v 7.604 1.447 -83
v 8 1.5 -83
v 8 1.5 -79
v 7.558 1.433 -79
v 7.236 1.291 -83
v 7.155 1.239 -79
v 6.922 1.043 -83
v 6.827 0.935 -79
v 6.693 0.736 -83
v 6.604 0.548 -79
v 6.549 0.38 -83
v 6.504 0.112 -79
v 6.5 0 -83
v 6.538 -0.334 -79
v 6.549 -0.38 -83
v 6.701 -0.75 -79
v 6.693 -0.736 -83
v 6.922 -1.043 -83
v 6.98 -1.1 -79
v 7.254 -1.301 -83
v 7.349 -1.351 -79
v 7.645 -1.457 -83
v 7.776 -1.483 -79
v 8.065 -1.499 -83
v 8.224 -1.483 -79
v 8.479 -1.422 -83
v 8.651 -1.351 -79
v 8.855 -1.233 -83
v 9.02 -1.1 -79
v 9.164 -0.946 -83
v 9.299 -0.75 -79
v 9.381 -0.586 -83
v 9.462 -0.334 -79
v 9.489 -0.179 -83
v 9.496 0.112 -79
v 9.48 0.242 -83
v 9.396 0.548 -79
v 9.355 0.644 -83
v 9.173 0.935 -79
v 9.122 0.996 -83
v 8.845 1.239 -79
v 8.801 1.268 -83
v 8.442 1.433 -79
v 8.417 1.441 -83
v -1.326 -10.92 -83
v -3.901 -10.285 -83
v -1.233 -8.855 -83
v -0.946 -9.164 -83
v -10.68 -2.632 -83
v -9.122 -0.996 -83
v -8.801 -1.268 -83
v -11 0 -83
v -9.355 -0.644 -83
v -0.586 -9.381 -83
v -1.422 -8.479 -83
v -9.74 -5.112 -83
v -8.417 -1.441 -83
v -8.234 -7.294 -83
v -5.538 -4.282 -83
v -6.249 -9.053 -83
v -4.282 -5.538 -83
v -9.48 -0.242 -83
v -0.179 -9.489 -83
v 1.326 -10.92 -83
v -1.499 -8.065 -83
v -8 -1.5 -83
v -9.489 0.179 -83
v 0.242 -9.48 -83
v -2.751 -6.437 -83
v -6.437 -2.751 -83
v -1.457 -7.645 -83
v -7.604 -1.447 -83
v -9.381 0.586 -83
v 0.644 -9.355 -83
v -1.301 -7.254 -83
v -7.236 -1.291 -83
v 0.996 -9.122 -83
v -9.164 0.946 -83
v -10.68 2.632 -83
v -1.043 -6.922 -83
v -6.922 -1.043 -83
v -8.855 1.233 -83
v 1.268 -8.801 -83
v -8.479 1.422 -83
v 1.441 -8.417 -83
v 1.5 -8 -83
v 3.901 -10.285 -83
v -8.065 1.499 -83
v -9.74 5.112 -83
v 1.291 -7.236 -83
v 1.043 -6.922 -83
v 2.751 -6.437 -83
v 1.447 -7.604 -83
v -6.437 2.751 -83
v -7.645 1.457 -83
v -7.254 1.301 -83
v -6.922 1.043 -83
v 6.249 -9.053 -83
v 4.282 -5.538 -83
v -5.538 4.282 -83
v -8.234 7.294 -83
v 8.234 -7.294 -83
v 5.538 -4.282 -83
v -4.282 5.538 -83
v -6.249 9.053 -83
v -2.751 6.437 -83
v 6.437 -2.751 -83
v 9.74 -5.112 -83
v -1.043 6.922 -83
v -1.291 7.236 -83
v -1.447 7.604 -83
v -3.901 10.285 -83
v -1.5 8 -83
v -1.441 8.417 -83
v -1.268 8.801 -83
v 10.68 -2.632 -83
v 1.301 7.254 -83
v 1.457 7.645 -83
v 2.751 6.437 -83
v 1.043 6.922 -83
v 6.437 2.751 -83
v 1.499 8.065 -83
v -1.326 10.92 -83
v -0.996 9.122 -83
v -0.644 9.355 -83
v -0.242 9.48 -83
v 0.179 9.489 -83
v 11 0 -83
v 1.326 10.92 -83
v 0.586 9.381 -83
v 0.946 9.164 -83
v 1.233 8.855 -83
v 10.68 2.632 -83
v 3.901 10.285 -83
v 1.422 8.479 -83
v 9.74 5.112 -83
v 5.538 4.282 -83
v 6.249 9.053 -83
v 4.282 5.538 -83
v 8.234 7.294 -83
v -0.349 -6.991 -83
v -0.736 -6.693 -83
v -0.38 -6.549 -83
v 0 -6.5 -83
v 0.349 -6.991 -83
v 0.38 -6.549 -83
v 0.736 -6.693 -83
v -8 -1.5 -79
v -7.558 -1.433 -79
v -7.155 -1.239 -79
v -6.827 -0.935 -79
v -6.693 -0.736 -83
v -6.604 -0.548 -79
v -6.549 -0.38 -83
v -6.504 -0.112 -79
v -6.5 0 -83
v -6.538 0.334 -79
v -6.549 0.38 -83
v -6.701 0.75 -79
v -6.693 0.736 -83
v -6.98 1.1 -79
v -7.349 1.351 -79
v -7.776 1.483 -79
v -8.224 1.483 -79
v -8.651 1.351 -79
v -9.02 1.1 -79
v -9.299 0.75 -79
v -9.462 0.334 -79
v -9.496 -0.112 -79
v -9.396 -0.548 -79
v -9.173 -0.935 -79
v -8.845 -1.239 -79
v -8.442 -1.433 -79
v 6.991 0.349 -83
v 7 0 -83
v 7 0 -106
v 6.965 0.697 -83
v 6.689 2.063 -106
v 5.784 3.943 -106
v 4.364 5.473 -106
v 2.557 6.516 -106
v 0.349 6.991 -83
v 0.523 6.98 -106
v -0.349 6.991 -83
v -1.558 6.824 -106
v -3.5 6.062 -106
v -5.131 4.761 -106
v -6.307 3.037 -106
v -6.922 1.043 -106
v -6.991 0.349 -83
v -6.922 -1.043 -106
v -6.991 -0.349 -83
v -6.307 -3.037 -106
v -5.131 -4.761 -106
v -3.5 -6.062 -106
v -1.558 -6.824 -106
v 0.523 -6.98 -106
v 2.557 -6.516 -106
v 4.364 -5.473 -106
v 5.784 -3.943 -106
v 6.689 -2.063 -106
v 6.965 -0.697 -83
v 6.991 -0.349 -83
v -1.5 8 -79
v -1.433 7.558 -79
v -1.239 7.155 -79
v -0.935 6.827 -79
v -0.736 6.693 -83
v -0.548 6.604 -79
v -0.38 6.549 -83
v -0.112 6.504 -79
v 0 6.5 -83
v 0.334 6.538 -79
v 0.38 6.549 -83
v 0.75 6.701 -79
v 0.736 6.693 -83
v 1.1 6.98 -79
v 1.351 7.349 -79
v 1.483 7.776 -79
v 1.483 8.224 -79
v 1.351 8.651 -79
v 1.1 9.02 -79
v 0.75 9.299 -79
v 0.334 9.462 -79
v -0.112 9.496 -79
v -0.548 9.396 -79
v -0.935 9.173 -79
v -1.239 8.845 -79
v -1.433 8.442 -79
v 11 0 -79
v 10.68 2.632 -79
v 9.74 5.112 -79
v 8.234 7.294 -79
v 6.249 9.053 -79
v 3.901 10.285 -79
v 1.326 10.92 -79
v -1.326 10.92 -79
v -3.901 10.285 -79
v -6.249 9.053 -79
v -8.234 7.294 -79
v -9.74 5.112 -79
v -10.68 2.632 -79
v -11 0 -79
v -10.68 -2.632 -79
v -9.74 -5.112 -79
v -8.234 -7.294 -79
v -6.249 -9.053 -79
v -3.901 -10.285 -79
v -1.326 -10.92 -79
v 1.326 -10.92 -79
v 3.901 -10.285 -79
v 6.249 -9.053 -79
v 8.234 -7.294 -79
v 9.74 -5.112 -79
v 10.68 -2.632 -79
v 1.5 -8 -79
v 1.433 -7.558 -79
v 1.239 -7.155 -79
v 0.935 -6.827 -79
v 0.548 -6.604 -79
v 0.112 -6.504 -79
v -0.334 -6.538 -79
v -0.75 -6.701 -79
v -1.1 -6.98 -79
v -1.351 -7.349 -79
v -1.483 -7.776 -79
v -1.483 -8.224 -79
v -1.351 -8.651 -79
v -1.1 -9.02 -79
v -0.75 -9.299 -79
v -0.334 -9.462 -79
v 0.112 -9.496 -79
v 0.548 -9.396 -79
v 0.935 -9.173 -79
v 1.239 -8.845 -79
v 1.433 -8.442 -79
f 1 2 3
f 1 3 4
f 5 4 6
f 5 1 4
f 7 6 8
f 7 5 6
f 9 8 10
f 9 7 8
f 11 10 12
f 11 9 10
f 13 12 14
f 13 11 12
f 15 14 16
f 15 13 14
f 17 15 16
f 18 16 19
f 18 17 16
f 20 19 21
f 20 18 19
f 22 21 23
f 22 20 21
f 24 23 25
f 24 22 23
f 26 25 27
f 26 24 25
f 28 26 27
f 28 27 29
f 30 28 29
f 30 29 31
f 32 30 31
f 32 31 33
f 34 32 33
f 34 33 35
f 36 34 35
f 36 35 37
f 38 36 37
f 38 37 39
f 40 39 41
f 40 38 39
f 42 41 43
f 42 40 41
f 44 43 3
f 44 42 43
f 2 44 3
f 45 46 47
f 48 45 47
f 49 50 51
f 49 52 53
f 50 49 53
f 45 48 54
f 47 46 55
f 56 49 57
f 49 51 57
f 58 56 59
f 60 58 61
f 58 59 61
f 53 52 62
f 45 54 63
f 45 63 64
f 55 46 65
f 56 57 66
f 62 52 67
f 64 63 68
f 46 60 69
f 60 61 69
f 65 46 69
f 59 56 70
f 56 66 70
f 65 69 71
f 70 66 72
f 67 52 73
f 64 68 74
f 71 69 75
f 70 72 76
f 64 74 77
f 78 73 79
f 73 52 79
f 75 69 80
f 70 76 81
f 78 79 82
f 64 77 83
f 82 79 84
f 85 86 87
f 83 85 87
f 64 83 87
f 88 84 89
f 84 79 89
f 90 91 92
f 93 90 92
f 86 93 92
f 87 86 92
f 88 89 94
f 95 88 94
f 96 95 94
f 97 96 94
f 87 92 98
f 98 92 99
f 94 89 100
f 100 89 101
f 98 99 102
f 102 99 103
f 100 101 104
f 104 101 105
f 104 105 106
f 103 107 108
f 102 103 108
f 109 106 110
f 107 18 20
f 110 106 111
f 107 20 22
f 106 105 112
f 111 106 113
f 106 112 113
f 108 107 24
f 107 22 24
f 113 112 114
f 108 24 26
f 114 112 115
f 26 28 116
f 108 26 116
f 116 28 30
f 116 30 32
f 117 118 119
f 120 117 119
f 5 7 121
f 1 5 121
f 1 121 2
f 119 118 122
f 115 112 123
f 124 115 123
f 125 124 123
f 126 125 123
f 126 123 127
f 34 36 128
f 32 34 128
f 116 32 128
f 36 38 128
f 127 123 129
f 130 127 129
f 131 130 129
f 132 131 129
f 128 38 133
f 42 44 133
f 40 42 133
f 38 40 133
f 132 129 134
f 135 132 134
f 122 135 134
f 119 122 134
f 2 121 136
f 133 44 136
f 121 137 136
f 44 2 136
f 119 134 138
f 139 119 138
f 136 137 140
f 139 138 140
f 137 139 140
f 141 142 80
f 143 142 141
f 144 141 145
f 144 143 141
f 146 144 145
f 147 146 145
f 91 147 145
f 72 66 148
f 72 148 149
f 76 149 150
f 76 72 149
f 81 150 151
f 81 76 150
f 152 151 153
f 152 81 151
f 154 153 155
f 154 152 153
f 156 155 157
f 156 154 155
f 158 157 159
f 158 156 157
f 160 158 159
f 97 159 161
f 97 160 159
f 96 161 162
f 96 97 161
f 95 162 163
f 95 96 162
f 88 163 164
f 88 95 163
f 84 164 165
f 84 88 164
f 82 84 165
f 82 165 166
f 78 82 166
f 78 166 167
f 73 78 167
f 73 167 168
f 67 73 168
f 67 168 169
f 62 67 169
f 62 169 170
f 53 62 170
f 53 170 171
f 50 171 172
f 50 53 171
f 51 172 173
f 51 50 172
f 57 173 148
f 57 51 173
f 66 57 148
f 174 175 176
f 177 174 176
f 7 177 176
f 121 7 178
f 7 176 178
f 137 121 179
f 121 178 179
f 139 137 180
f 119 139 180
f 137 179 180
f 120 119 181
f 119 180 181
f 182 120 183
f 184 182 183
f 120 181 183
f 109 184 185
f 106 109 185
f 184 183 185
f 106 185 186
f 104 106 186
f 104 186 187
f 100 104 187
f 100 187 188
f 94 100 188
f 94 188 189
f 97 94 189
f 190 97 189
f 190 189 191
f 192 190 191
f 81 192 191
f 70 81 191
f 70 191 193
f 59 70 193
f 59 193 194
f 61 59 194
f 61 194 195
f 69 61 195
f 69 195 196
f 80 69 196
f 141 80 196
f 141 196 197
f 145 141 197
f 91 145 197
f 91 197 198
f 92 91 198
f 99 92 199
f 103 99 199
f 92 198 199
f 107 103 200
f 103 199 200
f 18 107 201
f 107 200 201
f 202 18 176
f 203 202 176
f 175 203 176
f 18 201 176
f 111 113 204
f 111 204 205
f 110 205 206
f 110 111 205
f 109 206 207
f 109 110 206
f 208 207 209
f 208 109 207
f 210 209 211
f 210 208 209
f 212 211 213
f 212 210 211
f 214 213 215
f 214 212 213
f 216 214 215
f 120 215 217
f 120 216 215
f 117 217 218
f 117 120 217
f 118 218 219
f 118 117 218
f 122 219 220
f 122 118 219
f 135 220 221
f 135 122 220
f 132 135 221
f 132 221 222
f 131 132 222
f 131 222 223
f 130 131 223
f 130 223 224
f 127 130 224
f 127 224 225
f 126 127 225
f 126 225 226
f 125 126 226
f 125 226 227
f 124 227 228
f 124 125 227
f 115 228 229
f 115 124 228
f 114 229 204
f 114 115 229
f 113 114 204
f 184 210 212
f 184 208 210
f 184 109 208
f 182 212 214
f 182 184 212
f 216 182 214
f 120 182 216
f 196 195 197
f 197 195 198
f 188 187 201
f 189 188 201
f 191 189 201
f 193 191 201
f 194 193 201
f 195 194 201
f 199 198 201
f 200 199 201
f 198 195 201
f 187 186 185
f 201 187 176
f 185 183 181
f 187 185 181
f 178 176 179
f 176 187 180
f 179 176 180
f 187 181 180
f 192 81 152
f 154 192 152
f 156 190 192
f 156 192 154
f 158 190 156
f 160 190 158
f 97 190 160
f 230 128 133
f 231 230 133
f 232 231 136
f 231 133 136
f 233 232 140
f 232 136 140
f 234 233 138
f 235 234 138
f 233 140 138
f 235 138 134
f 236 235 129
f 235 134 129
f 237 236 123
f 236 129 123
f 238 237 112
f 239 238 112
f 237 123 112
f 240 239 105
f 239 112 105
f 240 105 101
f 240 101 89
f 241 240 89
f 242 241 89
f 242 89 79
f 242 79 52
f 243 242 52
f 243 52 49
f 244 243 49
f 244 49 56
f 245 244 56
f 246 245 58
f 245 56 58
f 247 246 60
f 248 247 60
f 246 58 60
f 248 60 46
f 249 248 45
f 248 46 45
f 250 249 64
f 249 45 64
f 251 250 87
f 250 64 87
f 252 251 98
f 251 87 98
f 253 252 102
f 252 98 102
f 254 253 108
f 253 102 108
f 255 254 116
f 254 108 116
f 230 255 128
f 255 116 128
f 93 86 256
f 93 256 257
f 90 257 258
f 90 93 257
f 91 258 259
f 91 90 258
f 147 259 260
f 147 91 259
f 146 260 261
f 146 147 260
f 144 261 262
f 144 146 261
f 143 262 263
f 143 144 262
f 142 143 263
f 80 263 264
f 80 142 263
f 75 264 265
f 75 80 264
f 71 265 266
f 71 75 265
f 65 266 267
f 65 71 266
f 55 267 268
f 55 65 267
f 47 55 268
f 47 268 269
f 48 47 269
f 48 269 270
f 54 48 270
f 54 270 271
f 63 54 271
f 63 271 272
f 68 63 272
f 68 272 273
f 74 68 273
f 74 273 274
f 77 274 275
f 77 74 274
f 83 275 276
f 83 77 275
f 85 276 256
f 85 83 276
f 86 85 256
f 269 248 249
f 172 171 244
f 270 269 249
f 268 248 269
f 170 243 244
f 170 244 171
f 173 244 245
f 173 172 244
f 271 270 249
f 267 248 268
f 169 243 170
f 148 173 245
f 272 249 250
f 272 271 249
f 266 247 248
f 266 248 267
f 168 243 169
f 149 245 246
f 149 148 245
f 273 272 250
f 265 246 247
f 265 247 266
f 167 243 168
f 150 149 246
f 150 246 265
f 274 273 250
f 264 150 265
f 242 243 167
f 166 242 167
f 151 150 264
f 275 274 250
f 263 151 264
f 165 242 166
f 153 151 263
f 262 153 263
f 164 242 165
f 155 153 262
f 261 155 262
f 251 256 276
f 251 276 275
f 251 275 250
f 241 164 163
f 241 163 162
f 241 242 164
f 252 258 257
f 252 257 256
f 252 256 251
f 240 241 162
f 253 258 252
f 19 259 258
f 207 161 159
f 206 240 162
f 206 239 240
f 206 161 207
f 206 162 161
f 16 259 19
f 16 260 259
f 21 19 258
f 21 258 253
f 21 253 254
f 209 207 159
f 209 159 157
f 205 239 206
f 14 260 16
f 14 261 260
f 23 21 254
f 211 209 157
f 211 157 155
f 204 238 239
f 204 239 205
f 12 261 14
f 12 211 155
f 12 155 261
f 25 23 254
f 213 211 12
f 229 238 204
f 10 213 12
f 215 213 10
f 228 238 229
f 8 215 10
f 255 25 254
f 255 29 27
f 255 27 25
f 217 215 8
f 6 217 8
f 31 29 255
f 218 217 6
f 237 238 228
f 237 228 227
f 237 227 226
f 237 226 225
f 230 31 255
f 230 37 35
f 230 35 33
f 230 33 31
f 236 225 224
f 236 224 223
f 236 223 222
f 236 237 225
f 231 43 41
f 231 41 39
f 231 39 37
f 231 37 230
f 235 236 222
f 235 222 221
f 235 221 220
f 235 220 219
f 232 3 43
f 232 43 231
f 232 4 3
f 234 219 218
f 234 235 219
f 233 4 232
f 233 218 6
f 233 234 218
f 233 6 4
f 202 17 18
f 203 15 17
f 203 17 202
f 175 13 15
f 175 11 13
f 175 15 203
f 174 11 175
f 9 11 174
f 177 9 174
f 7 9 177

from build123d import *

# Parameters (mm, degrees)
CYLINDER004_R     = 7
CYLINDER004_DEPTH = 23
CYLINDER006_R     = 1.5
CYLINDER006_DEPTH = 20
ARRAY001_COUNT    = 4
CYLINDER005_R     = 11
CYLINDER005_DEPTH = 4


with BuildPart() as backlash_nut_cylinder:
    # Cylinder004 → Cylinder004 (new body)
    with BuildSketch(Plane.XY.offset(-23)):
        Circle(CYLINDER004_R)
    extrude(amount=CYLINDER004_DEPTH)


with BuildPart() as array001:
    # Cylinder006 → Cylinder006 (new body)
    with BuildSketch(Plane(origin=(0, -8, -5), x_dir=(1, 0, 0), z_dir=(0, 0, 1))):
        Circle(CYLINDER006_R)
    extrude(amount=CYLINDER006_DEPTH)

    # Array001: Array001 ×4 about axis
    array001_axis = Axis((0, 0, 0), (0, 0, 1))


with BuildPart() as array001_1:
    add(array001.part)
    for i in range(1, ARRAY001_COUNT):
        add(array001.part.rotate(array001_axis, i * 360 / ARRAY001_COUNT))


with BuildPart() as backlash_nut_union:
    # Cylinder005 → Cylinder005 (new body)
    with BuildSketch(Plane.XY):
        Circle(CYLINDER005_R)
    extrude(amount=CYLINDER005_DEPTH)

    # Cut: cut Array001
    add(array001_1.part, mode=Mode.SUBTRACT)

    # Fusion: union backlash nut cylinder
    add(backlash_nut_cylinder.part)


with BuildPart() as backlash_nut_union_1:
    # Fusion placement: moved
    add(backlash_nut_union.part.moved(Location((0, 0, -83))))


solid = backlash_nut_union_1.part
